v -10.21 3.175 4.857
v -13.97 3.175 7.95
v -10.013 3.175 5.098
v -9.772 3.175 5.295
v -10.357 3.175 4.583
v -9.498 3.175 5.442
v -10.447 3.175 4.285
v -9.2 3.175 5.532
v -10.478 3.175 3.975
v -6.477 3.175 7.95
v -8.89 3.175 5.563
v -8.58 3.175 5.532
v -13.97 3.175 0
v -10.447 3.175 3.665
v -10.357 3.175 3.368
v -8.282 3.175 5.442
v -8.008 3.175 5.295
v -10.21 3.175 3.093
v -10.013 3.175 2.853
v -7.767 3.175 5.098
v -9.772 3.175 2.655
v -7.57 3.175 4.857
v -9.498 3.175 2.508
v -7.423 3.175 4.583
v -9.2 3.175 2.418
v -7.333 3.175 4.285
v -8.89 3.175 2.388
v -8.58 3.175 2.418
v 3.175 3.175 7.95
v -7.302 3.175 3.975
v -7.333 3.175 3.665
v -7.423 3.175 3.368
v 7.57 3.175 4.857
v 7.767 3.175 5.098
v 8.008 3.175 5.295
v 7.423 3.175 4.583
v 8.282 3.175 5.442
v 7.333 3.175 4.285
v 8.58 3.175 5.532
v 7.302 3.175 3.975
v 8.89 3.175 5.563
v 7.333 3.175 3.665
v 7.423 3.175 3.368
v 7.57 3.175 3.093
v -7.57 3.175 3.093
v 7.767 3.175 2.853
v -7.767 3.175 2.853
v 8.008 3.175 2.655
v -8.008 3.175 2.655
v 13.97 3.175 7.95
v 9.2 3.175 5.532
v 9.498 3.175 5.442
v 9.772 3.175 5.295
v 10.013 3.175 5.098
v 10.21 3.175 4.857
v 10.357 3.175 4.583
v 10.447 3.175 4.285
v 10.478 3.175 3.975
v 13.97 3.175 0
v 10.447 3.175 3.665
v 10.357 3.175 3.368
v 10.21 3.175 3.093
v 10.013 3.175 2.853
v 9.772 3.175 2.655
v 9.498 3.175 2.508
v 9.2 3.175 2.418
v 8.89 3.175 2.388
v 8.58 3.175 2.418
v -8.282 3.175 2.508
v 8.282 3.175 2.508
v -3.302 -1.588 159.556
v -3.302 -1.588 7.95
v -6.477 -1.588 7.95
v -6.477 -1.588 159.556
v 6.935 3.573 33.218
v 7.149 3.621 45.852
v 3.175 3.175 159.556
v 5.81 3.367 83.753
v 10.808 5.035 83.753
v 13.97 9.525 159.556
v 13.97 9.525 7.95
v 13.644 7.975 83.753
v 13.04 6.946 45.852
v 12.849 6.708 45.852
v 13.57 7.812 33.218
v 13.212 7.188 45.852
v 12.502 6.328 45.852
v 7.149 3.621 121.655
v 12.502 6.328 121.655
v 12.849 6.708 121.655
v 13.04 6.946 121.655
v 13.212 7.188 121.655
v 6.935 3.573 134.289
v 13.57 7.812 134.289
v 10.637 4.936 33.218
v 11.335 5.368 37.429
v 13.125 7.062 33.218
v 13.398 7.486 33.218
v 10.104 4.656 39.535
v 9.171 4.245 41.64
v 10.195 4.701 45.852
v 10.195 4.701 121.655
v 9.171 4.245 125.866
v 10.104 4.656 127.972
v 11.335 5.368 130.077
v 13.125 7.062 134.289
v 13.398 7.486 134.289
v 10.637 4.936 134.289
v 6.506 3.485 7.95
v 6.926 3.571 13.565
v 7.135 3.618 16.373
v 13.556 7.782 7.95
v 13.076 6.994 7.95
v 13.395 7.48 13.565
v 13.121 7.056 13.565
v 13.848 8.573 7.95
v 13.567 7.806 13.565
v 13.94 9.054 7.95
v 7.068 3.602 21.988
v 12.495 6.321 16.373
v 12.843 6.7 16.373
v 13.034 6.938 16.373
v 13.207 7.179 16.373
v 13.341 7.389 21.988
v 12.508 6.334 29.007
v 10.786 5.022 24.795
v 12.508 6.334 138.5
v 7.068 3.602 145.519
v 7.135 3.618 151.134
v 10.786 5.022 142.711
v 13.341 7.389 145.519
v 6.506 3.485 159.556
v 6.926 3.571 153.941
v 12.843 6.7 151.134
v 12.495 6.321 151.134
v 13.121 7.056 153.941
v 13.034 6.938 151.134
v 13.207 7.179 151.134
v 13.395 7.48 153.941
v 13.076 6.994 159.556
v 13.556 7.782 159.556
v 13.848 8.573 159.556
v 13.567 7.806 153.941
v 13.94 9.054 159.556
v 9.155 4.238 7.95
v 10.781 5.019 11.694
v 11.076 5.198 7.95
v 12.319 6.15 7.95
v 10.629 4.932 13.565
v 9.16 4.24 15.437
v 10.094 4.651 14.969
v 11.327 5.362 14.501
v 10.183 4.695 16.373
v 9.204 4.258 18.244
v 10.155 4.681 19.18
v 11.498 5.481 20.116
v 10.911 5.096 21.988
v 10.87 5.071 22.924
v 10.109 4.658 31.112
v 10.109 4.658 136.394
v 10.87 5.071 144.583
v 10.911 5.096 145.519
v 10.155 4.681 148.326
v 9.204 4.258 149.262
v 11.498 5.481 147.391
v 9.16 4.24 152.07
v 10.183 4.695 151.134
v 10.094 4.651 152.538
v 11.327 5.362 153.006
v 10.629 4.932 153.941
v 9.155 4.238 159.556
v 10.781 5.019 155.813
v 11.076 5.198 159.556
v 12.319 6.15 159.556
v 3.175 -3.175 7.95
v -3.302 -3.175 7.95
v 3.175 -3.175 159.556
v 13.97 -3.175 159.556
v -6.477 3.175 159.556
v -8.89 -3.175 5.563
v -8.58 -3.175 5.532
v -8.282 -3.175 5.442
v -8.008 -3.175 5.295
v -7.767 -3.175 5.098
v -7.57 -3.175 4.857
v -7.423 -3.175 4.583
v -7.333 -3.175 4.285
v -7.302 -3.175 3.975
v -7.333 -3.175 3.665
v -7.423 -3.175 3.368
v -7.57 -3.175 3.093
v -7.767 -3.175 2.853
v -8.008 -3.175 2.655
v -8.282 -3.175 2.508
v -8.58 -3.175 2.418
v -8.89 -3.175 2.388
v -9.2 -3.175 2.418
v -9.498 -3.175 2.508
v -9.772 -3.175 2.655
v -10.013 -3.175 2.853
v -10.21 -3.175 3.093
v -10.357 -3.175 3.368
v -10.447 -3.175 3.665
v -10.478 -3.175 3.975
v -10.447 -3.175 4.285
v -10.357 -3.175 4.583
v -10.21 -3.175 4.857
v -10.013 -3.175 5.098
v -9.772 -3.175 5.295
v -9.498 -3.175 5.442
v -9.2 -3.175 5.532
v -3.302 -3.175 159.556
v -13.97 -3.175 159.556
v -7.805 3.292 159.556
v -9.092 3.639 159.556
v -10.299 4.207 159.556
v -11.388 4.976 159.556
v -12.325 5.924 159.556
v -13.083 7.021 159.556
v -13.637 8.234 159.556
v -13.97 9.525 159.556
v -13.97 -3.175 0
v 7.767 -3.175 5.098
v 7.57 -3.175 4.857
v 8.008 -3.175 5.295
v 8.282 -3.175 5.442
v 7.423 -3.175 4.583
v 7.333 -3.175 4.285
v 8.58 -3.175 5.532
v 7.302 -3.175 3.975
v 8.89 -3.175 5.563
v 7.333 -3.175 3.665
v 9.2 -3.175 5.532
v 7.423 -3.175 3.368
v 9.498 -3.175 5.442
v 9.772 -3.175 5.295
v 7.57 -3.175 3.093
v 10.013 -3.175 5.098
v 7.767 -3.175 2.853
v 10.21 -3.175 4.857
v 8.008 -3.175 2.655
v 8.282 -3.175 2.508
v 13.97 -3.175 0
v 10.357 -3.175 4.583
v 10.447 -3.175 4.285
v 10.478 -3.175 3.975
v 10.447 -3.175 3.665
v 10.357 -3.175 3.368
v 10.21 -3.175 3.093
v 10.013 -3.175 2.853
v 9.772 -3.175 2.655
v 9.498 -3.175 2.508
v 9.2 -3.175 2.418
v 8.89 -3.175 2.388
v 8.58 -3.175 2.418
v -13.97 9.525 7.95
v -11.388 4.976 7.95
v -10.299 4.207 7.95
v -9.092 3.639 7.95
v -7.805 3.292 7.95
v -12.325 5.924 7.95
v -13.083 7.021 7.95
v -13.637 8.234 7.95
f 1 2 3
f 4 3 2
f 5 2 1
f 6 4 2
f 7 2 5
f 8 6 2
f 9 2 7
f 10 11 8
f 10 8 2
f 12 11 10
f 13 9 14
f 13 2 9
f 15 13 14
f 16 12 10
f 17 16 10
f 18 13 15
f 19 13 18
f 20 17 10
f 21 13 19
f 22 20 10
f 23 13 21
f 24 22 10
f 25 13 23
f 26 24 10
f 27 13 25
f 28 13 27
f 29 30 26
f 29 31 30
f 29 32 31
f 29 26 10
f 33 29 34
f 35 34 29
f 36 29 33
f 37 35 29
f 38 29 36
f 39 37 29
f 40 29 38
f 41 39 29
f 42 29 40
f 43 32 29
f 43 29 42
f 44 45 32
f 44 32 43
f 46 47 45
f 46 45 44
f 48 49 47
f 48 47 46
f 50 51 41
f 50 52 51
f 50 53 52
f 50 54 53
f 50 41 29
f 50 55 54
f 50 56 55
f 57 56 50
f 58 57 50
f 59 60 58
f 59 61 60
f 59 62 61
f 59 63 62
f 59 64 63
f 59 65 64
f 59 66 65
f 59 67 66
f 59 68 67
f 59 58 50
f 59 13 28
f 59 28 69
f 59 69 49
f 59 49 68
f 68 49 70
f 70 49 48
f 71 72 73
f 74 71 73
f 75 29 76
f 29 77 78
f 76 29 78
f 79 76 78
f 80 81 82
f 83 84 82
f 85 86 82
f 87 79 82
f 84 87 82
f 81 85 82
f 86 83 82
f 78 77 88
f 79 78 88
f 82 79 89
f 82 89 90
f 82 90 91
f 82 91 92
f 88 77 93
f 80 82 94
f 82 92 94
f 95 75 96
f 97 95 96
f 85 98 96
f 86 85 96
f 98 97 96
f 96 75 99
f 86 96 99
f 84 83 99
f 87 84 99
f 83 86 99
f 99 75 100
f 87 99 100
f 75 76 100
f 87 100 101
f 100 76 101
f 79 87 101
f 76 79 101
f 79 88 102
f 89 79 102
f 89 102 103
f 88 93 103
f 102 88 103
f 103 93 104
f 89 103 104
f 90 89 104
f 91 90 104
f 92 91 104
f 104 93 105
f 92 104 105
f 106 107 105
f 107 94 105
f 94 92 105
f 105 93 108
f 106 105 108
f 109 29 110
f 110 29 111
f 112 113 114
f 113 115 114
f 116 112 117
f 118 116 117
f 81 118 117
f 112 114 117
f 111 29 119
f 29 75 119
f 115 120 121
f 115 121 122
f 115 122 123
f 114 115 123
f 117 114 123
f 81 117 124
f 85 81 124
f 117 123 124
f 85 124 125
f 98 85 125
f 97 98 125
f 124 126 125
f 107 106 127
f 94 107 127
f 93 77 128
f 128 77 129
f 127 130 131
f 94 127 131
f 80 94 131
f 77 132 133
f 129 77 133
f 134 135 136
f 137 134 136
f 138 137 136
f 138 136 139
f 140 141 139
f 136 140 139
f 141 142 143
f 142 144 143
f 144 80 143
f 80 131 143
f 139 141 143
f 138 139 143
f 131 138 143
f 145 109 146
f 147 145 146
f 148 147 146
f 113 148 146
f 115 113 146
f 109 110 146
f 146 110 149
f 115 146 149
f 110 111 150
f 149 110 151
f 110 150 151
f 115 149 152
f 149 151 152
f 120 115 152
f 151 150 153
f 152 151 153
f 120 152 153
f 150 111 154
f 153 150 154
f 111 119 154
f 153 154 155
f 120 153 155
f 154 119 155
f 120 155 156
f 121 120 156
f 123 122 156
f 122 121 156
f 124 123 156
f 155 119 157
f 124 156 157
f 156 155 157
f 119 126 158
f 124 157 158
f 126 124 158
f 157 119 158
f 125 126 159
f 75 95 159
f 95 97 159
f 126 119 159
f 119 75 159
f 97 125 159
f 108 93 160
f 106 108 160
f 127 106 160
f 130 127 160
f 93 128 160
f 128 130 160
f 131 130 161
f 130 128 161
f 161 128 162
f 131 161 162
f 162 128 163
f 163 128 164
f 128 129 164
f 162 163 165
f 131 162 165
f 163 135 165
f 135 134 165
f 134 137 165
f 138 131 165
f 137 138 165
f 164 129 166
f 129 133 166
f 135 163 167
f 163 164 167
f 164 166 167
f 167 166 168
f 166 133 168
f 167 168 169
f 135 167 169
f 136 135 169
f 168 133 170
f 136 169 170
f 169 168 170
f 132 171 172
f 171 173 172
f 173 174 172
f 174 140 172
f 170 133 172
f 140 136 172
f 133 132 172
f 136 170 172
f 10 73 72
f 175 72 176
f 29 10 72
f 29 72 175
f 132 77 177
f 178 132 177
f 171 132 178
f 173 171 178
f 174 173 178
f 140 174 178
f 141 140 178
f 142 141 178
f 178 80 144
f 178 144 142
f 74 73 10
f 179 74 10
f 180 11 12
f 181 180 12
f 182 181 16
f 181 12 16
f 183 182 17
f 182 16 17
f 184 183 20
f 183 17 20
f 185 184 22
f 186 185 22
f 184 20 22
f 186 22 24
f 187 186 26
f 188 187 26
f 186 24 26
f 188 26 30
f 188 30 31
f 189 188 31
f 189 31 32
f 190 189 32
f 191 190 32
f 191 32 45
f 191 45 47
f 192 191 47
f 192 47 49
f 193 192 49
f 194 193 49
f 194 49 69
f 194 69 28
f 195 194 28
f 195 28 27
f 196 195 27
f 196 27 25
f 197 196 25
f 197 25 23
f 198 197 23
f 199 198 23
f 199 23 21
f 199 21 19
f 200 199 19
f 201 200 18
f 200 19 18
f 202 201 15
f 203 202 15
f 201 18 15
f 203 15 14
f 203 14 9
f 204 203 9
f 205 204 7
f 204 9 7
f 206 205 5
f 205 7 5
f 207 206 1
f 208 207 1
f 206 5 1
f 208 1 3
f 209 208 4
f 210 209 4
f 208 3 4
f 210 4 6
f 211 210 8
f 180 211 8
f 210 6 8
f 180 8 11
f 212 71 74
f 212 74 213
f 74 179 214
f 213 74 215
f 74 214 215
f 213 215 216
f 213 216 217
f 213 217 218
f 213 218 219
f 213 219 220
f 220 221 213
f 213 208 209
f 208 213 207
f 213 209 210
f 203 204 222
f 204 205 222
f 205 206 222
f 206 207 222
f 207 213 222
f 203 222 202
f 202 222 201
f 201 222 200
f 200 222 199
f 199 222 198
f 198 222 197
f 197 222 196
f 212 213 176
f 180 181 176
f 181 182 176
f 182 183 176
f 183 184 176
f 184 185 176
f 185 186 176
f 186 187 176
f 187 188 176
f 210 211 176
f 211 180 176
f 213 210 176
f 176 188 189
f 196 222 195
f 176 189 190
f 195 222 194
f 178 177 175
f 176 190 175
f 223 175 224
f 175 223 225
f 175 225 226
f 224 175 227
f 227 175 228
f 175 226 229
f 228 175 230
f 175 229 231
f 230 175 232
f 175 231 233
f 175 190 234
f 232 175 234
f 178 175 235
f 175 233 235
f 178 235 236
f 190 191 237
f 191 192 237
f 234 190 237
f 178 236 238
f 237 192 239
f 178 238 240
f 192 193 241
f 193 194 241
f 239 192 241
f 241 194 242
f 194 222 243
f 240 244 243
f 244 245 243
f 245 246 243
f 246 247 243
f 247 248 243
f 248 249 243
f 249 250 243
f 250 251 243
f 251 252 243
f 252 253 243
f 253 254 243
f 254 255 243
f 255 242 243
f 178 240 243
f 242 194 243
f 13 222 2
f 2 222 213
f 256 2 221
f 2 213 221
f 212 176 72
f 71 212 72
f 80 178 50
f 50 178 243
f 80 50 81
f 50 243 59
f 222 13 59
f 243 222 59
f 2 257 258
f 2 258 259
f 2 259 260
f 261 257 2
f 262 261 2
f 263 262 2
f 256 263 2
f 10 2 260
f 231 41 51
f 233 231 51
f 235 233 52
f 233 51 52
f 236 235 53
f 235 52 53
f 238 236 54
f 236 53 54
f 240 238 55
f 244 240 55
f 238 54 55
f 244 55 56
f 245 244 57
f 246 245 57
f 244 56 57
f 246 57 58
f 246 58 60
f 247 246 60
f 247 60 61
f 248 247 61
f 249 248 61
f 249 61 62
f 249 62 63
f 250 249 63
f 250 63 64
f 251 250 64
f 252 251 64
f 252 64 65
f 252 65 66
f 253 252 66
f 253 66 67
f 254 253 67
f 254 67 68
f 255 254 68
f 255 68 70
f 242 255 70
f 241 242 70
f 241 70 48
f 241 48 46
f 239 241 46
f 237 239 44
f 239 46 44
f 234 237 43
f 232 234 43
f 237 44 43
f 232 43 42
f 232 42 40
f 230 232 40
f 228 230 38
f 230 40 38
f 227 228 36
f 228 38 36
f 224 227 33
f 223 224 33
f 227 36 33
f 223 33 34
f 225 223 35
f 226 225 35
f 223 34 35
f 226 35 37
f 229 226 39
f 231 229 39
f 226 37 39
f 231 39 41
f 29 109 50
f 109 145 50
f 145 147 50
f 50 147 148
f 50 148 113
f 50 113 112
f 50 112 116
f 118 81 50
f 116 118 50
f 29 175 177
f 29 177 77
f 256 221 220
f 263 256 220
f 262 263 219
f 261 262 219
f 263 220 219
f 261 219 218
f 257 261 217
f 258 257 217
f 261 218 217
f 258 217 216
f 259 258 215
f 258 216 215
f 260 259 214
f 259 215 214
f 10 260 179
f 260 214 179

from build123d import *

# Parameters (mm, degrees)
SKETCH1_W           = 27.94
SKETCH1_H           = 6.35
BOSS_EXTRUDE1_DEPTH = 7.9502
SKETCH2_W           = 10.795
SKETCH2_H           = 6.35
BOSS_EXTRUDE2_DEPTH = 151.60625
SKETCH4_R           = 1.5875
CUT_EXTRUDE1_DEPTH  = 161.292682729
BOSS_EXTRUDE3_DEPTH = 151.60625


with BuildPart() as part:
    # Sketch1 → Boss-Extrude1 (new body)
    with BuildSketch(Plane.XY):
        Rectangle(SKETCH1_W, SKETCH1_H)
    extrude(amount=BOSS_EXTRUDE1_DEPTH)

    # Sketch2 → Boss-Extrude2 (add)
    with BuildSketch(Plane.XY.offset(7.9502)):
        Polygon((-3.302, -3.175), (-3.302, -1.5875), (-6.477, -1.5875), (-6.477, 3.175), (-13.97, 3.175), (-13.97, -3.175), align=None)
        with Locations((8.5725, 0)):
            Rectangle(SKETCH2_W, SKETCH2_H)
    extrude(amount=BOSS_EXTRUDE2_DEPTH)

    # Sketch4 → Cut-Extrude1 (cut, through all)
    with BuildSketch(Plane(origin=(0, 3.175, 0), x_dir=(1, 0, 0), z_dir=(0, 1, 0))):
        with Locations(Location((-8.89, -3.9751, 0), (0, 0, 270))):
            Circle(SKETCH4_R)
        with Locations(Location((8.89, -3.9751, 0), (0, 0, 270))):
            Circle(SKETCH4_R)
    extrude(amount=-CUT_EXTRUDE1_DEPTH, mode=Mode.SUBTRACT)

    # Sketch5 → Boss-Extrude3 (add)
    with BuildSketch(Plane.XY.offset(159.55645)):
        with BuildLine():
            Line((-13.97, 3.175), (-13.97, 9.525))
            ThreePointArc((-13.97, 9.525), (-11.38789475, 4.976014194), (-6.477, 3.175))
            Line((-6.477, 3.175), (-13.97, 3.175))
        make_face()
        with BuildLine():
            Line((3.175, 3.175), (13.97, 3.175))
            Line((13.97, 3.175), (13.97, 9.525))
            add(Edge.make_bspline(
                [(3.175, 3.175), (13.97, 3.175), (13.97, 9.525)],
                knots=[4.71238898, 4.71238898, 4.71238898, 6.283185307, 6.283185307, 6.283185307], degree=2, weights=[1, 0.707106781, 1]))
        make_face()
    extrude(amount=-BOSS_EXTRUDE3_DEPTH)


solid = part.part
